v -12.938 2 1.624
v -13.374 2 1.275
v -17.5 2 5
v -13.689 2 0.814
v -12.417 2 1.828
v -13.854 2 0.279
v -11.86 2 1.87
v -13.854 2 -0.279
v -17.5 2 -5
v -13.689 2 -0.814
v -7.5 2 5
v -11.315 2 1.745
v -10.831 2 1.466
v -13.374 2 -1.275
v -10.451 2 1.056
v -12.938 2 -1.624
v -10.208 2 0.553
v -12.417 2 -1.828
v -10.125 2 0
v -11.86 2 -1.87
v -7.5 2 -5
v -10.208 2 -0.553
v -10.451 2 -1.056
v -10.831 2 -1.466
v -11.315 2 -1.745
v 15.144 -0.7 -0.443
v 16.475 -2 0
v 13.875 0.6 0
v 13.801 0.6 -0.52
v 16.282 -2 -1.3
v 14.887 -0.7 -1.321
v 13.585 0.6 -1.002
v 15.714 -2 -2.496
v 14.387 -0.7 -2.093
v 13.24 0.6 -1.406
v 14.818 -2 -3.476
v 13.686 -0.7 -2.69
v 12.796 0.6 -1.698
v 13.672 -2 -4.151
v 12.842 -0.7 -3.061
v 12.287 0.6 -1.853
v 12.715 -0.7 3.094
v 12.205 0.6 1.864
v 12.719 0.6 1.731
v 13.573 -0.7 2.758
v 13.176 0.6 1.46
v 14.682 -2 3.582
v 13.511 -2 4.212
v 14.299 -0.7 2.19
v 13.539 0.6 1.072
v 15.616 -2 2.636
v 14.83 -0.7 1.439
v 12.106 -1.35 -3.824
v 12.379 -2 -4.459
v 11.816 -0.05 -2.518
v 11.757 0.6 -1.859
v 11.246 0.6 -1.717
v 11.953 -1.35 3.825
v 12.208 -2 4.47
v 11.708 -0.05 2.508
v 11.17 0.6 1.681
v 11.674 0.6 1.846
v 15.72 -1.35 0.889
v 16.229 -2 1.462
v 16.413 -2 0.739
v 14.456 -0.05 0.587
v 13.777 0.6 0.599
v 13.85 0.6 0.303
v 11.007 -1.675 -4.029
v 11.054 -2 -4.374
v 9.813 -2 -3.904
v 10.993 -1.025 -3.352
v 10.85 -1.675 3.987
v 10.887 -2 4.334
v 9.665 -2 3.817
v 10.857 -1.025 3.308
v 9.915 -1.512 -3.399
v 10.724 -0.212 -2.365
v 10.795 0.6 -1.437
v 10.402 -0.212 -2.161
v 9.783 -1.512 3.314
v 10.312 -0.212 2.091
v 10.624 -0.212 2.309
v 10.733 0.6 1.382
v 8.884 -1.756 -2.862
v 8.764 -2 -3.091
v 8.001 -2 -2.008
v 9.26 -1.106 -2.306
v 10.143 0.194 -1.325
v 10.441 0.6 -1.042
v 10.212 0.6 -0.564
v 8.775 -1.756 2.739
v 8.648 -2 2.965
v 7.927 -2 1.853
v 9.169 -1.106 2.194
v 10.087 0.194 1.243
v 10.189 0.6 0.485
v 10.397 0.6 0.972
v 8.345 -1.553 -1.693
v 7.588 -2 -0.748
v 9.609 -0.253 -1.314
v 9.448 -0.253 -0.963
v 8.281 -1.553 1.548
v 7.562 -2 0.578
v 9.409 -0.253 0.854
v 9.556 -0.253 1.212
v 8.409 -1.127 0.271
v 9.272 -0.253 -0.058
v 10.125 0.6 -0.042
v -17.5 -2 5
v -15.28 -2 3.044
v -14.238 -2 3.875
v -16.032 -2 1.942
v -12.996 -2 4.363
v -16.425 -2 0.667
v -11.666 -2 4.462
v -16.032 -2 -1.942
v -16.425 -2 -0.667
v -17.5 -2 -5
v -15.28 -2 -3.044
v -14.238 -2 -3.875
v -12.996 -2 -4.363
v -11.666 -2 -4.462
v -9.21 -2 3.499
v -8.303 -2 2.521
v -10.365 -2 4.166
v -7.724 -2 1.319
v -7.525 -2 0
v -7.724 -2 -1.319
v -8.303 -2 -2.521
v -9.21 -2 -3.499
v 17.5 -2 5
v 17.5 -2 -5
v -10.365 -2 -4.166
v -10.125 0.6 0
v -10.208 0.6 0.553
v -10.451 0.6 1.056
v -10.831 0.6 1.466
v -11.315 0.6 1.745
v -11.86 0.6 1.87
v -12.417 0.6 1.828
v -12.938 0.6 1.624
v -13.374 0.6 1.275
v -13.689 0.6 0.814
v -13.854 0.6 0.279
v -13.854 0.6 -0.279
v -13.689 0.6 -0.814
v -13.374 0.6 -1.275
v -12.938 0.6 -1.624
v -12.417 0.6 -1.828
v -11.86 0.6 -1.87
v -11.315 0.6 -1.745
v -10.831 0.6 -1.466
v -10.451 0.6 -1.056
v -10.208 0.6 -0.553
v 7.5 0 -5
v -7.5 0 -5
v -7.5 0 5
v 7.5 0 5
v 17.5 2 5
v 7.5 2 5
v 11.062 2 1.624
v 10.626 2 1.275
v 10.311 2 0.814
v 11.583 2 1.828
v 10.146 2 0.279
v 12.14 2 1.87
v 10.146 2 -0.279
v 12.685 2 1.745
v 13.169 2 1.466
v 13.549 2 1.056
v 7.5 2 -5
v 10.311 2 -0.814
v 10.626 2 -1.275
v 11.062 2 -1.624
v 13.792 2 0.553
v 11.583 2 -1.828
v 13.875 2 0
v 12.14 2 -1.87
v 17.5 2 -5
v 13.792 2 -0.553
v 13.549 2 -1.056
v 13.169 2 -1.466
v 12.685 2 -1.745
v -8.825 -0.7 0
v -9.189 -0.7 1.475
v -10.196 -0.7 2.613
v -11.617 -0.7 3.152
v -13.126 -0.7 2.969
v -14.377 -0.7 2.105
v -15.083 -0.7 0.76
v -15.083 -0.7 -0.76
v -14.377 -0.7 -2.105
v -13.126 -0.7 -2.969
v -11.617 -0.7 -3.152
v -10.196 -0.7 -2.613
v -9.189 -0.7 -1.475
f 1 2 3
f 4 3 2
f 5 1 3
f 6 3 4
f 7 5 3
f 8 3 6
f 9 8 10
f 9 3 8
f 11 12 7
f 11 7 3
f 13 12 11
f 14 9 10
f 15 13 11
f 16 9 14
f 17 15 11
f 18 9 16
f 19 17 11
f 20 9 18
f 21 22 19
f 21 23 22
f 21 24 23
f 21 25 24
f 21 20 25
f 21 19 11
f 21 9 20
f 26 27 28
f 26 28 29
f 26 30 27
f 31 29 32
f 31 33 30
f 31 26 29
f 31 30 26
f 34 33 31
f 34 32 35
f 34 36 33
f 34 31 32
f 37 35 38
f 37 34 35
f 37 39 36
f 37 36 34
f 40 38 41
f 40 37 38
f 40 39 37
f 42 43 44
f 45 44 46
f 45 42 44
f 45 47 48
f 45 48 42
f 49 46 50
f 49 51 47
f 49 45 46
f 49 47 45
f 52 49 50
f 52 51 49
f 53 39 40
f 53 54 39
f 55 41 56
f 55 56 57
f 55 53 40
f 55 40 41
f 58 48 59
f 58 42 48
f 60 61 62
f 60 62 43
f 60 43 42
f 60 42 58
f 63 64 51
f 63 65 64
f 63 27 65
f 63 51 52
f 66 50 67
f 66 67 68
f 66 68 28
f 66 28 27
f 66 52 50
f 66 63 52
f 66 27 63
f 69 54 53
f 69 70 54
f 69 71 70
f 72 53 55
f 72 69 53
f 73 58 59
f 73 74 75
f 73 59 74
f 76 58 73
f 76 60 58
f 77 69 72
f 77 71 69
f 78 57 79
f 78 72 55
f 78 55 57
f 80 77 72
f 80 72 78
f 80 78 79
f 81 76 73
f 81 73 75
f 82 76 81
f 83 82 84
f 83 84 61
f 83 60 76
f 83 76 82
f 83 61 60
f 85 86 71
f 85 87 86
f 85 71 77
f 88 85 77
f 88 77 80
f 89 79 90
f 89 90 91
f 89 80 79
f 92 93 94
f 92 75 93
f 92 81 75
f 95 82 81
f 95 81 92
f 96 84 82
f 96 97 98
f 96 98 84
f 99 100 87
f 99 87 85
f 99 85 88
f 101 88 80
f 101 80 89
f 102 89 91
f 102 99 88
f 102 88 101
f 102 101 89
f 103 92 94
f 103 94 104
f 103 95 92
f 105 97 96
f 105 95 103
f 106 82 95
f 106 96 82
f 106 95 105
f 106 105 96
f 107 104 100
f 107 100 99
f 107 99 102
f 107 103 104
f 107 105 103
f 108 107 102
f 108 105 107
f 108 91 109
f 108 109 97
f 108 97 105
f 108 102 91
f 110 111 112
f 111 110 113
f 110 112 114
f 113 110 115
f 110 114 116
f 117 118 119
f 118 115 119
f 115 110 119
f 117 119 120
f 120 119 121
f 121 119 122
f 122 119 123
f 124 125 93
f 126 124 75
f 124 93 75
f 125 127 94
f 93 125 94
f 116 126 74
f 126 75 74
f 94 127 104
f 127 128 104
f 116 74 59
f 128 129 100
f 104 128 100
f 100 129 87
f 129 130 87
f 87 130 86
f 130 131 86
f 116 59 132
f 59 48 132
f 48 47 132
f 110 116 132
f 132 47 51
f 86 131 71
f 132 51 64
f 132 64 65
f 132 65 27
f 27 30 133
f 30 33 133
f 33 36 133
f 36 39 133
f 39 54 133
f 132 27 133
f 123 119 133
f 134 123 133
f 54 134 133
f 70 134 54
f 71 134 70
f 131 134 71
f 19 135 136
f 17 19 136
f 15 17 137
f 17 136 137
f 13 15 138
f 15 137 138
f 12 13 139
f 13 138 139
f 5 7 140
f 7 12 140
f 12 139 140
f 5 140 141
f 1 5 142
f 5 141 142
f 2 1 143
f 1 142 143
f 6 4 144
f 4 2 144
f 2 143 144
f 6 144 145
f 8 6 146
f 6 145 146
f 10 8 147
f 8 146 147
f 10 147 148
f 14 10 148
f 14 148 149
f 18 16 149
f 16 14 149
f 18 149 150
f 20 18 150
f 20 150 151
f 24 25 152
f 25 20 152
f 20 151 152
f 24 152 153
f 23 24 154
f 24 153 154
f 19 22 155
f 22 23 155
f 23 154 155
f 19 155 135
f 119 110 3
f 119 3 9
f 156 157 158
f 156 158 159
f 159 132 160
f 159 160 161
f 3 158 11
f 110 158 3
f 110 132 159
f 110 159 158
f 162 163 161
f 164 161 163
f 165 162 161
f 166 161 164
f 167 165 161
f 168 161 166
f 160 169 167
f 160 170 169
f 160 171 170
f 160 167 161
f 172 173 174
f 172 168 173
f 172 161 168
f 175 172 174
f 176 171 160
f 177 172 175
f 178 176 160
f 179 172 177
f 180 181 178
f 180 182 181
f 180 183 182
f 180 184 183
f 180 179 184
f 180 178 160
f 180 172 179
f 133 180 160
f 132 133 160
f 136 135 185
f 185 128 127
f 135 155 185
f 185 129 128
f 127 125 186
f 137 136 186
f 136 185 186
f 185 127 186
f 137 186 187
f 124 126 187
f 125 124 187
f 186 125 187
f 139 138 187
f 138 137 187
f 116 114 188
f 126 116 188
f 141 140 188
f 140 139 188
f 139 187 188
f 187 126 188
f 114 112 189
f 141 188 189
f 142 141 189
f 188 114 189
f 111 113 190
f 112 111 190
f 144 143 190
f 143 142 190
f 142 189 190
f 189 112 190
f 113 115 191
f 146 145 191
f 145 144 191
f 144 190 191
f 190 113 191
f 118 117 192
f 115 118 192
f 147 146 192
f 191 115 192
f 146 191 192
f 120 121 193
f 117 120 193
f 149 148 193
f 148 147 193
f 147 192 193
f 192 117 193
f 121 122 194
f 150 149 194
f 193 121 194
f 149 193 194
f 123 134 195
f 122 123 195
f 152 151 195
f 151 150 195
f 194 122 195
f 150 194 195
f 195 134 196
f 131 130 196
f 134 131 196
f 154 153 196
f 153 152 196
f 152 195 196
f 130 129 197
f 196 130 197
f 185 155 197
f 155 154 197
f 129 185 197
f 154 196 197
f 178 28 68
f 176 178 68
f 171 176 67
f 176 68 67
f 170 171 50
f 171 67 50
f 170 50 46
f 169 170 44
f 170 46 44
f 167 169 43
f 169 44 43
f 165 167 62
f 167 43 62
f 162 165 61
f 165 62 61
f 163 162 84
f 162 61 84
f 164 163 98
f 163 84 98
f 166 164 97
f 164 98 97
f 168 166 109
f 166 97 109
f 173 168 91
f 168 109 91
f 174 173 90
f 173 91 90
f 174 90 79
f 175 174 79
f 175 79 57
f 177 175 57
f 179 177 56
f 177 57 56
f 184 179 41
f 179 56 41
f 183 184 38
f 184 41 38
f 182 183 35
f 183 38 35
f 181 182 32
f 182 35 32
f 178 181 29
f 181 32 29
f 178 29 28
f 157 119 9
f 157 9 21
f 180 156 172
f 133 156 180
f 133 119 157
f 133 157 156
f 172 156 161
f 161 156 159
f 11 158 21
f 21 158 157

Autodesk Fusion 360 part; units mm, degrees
sketch "Sketch1" plane through (0, 0, 0) normal (0, 1, 0) x (1, 0, 0)
  line L0 (-17.5, 5) -> (17.5, 5)
  line L1 (17.5, 5) -> (17.5, -5)
  line L2 (17.5, -5) -> (-17.5, -5)
  line L3 (-17.5, -5) -> (-17.5, 5)
  line L4 (-17.5, 5) -> (17.5, -5) construction
  line L5 (17.5, 5) -> (-17.5, -5) construction
  line L6 (-7.5, 5) -> (7.5, 5)
  line L7 (7.5, 5) -> (7.5, -5)
  line L8 (7.5, -5) -> (-7.5, -5)
  line L9 (-7.5, -5) -> (-7.5, 5)
  line L10 (-7.5, 5) -> (7.5, -5) construction
  line L11 (7.5, 5) -> (-7.5, -5) construction
  circle A0 centre (-12, 0) radius 1.875
  line L12 (0, -5) -> (0, -10.3309) construction
  line L13 (0, -5) -> (0, -10.3309) construction
  circle A1 centre (12, 0) radius 1.875
  dimension "d1" = 15
  dimension "d2" = 35
  dimension "d3" = 10
  dimension "d4" = 3.75
extrude "Extrude1" add sketch "Sketch1" along normal blind 2 contours L0 L2 L3 L9 | L0 L1 L2 L7 makes body 1 at (-16.2917, 0, 0) makes body 2 at (16.2917, 0, 0)
extrude "Extrude2" add sketch "Sketch1" against normal blind 2 bodies 1 2
chamfer "Chamfer1" distance 2.6 angle 45 2 edges at (-13.7481, -2, 0.678) (10.2519, -2, 0.678) on bodies 1
equation "d2 = 15 mm + 4 mm + 4 mm + 8 mm + 4 mm"
